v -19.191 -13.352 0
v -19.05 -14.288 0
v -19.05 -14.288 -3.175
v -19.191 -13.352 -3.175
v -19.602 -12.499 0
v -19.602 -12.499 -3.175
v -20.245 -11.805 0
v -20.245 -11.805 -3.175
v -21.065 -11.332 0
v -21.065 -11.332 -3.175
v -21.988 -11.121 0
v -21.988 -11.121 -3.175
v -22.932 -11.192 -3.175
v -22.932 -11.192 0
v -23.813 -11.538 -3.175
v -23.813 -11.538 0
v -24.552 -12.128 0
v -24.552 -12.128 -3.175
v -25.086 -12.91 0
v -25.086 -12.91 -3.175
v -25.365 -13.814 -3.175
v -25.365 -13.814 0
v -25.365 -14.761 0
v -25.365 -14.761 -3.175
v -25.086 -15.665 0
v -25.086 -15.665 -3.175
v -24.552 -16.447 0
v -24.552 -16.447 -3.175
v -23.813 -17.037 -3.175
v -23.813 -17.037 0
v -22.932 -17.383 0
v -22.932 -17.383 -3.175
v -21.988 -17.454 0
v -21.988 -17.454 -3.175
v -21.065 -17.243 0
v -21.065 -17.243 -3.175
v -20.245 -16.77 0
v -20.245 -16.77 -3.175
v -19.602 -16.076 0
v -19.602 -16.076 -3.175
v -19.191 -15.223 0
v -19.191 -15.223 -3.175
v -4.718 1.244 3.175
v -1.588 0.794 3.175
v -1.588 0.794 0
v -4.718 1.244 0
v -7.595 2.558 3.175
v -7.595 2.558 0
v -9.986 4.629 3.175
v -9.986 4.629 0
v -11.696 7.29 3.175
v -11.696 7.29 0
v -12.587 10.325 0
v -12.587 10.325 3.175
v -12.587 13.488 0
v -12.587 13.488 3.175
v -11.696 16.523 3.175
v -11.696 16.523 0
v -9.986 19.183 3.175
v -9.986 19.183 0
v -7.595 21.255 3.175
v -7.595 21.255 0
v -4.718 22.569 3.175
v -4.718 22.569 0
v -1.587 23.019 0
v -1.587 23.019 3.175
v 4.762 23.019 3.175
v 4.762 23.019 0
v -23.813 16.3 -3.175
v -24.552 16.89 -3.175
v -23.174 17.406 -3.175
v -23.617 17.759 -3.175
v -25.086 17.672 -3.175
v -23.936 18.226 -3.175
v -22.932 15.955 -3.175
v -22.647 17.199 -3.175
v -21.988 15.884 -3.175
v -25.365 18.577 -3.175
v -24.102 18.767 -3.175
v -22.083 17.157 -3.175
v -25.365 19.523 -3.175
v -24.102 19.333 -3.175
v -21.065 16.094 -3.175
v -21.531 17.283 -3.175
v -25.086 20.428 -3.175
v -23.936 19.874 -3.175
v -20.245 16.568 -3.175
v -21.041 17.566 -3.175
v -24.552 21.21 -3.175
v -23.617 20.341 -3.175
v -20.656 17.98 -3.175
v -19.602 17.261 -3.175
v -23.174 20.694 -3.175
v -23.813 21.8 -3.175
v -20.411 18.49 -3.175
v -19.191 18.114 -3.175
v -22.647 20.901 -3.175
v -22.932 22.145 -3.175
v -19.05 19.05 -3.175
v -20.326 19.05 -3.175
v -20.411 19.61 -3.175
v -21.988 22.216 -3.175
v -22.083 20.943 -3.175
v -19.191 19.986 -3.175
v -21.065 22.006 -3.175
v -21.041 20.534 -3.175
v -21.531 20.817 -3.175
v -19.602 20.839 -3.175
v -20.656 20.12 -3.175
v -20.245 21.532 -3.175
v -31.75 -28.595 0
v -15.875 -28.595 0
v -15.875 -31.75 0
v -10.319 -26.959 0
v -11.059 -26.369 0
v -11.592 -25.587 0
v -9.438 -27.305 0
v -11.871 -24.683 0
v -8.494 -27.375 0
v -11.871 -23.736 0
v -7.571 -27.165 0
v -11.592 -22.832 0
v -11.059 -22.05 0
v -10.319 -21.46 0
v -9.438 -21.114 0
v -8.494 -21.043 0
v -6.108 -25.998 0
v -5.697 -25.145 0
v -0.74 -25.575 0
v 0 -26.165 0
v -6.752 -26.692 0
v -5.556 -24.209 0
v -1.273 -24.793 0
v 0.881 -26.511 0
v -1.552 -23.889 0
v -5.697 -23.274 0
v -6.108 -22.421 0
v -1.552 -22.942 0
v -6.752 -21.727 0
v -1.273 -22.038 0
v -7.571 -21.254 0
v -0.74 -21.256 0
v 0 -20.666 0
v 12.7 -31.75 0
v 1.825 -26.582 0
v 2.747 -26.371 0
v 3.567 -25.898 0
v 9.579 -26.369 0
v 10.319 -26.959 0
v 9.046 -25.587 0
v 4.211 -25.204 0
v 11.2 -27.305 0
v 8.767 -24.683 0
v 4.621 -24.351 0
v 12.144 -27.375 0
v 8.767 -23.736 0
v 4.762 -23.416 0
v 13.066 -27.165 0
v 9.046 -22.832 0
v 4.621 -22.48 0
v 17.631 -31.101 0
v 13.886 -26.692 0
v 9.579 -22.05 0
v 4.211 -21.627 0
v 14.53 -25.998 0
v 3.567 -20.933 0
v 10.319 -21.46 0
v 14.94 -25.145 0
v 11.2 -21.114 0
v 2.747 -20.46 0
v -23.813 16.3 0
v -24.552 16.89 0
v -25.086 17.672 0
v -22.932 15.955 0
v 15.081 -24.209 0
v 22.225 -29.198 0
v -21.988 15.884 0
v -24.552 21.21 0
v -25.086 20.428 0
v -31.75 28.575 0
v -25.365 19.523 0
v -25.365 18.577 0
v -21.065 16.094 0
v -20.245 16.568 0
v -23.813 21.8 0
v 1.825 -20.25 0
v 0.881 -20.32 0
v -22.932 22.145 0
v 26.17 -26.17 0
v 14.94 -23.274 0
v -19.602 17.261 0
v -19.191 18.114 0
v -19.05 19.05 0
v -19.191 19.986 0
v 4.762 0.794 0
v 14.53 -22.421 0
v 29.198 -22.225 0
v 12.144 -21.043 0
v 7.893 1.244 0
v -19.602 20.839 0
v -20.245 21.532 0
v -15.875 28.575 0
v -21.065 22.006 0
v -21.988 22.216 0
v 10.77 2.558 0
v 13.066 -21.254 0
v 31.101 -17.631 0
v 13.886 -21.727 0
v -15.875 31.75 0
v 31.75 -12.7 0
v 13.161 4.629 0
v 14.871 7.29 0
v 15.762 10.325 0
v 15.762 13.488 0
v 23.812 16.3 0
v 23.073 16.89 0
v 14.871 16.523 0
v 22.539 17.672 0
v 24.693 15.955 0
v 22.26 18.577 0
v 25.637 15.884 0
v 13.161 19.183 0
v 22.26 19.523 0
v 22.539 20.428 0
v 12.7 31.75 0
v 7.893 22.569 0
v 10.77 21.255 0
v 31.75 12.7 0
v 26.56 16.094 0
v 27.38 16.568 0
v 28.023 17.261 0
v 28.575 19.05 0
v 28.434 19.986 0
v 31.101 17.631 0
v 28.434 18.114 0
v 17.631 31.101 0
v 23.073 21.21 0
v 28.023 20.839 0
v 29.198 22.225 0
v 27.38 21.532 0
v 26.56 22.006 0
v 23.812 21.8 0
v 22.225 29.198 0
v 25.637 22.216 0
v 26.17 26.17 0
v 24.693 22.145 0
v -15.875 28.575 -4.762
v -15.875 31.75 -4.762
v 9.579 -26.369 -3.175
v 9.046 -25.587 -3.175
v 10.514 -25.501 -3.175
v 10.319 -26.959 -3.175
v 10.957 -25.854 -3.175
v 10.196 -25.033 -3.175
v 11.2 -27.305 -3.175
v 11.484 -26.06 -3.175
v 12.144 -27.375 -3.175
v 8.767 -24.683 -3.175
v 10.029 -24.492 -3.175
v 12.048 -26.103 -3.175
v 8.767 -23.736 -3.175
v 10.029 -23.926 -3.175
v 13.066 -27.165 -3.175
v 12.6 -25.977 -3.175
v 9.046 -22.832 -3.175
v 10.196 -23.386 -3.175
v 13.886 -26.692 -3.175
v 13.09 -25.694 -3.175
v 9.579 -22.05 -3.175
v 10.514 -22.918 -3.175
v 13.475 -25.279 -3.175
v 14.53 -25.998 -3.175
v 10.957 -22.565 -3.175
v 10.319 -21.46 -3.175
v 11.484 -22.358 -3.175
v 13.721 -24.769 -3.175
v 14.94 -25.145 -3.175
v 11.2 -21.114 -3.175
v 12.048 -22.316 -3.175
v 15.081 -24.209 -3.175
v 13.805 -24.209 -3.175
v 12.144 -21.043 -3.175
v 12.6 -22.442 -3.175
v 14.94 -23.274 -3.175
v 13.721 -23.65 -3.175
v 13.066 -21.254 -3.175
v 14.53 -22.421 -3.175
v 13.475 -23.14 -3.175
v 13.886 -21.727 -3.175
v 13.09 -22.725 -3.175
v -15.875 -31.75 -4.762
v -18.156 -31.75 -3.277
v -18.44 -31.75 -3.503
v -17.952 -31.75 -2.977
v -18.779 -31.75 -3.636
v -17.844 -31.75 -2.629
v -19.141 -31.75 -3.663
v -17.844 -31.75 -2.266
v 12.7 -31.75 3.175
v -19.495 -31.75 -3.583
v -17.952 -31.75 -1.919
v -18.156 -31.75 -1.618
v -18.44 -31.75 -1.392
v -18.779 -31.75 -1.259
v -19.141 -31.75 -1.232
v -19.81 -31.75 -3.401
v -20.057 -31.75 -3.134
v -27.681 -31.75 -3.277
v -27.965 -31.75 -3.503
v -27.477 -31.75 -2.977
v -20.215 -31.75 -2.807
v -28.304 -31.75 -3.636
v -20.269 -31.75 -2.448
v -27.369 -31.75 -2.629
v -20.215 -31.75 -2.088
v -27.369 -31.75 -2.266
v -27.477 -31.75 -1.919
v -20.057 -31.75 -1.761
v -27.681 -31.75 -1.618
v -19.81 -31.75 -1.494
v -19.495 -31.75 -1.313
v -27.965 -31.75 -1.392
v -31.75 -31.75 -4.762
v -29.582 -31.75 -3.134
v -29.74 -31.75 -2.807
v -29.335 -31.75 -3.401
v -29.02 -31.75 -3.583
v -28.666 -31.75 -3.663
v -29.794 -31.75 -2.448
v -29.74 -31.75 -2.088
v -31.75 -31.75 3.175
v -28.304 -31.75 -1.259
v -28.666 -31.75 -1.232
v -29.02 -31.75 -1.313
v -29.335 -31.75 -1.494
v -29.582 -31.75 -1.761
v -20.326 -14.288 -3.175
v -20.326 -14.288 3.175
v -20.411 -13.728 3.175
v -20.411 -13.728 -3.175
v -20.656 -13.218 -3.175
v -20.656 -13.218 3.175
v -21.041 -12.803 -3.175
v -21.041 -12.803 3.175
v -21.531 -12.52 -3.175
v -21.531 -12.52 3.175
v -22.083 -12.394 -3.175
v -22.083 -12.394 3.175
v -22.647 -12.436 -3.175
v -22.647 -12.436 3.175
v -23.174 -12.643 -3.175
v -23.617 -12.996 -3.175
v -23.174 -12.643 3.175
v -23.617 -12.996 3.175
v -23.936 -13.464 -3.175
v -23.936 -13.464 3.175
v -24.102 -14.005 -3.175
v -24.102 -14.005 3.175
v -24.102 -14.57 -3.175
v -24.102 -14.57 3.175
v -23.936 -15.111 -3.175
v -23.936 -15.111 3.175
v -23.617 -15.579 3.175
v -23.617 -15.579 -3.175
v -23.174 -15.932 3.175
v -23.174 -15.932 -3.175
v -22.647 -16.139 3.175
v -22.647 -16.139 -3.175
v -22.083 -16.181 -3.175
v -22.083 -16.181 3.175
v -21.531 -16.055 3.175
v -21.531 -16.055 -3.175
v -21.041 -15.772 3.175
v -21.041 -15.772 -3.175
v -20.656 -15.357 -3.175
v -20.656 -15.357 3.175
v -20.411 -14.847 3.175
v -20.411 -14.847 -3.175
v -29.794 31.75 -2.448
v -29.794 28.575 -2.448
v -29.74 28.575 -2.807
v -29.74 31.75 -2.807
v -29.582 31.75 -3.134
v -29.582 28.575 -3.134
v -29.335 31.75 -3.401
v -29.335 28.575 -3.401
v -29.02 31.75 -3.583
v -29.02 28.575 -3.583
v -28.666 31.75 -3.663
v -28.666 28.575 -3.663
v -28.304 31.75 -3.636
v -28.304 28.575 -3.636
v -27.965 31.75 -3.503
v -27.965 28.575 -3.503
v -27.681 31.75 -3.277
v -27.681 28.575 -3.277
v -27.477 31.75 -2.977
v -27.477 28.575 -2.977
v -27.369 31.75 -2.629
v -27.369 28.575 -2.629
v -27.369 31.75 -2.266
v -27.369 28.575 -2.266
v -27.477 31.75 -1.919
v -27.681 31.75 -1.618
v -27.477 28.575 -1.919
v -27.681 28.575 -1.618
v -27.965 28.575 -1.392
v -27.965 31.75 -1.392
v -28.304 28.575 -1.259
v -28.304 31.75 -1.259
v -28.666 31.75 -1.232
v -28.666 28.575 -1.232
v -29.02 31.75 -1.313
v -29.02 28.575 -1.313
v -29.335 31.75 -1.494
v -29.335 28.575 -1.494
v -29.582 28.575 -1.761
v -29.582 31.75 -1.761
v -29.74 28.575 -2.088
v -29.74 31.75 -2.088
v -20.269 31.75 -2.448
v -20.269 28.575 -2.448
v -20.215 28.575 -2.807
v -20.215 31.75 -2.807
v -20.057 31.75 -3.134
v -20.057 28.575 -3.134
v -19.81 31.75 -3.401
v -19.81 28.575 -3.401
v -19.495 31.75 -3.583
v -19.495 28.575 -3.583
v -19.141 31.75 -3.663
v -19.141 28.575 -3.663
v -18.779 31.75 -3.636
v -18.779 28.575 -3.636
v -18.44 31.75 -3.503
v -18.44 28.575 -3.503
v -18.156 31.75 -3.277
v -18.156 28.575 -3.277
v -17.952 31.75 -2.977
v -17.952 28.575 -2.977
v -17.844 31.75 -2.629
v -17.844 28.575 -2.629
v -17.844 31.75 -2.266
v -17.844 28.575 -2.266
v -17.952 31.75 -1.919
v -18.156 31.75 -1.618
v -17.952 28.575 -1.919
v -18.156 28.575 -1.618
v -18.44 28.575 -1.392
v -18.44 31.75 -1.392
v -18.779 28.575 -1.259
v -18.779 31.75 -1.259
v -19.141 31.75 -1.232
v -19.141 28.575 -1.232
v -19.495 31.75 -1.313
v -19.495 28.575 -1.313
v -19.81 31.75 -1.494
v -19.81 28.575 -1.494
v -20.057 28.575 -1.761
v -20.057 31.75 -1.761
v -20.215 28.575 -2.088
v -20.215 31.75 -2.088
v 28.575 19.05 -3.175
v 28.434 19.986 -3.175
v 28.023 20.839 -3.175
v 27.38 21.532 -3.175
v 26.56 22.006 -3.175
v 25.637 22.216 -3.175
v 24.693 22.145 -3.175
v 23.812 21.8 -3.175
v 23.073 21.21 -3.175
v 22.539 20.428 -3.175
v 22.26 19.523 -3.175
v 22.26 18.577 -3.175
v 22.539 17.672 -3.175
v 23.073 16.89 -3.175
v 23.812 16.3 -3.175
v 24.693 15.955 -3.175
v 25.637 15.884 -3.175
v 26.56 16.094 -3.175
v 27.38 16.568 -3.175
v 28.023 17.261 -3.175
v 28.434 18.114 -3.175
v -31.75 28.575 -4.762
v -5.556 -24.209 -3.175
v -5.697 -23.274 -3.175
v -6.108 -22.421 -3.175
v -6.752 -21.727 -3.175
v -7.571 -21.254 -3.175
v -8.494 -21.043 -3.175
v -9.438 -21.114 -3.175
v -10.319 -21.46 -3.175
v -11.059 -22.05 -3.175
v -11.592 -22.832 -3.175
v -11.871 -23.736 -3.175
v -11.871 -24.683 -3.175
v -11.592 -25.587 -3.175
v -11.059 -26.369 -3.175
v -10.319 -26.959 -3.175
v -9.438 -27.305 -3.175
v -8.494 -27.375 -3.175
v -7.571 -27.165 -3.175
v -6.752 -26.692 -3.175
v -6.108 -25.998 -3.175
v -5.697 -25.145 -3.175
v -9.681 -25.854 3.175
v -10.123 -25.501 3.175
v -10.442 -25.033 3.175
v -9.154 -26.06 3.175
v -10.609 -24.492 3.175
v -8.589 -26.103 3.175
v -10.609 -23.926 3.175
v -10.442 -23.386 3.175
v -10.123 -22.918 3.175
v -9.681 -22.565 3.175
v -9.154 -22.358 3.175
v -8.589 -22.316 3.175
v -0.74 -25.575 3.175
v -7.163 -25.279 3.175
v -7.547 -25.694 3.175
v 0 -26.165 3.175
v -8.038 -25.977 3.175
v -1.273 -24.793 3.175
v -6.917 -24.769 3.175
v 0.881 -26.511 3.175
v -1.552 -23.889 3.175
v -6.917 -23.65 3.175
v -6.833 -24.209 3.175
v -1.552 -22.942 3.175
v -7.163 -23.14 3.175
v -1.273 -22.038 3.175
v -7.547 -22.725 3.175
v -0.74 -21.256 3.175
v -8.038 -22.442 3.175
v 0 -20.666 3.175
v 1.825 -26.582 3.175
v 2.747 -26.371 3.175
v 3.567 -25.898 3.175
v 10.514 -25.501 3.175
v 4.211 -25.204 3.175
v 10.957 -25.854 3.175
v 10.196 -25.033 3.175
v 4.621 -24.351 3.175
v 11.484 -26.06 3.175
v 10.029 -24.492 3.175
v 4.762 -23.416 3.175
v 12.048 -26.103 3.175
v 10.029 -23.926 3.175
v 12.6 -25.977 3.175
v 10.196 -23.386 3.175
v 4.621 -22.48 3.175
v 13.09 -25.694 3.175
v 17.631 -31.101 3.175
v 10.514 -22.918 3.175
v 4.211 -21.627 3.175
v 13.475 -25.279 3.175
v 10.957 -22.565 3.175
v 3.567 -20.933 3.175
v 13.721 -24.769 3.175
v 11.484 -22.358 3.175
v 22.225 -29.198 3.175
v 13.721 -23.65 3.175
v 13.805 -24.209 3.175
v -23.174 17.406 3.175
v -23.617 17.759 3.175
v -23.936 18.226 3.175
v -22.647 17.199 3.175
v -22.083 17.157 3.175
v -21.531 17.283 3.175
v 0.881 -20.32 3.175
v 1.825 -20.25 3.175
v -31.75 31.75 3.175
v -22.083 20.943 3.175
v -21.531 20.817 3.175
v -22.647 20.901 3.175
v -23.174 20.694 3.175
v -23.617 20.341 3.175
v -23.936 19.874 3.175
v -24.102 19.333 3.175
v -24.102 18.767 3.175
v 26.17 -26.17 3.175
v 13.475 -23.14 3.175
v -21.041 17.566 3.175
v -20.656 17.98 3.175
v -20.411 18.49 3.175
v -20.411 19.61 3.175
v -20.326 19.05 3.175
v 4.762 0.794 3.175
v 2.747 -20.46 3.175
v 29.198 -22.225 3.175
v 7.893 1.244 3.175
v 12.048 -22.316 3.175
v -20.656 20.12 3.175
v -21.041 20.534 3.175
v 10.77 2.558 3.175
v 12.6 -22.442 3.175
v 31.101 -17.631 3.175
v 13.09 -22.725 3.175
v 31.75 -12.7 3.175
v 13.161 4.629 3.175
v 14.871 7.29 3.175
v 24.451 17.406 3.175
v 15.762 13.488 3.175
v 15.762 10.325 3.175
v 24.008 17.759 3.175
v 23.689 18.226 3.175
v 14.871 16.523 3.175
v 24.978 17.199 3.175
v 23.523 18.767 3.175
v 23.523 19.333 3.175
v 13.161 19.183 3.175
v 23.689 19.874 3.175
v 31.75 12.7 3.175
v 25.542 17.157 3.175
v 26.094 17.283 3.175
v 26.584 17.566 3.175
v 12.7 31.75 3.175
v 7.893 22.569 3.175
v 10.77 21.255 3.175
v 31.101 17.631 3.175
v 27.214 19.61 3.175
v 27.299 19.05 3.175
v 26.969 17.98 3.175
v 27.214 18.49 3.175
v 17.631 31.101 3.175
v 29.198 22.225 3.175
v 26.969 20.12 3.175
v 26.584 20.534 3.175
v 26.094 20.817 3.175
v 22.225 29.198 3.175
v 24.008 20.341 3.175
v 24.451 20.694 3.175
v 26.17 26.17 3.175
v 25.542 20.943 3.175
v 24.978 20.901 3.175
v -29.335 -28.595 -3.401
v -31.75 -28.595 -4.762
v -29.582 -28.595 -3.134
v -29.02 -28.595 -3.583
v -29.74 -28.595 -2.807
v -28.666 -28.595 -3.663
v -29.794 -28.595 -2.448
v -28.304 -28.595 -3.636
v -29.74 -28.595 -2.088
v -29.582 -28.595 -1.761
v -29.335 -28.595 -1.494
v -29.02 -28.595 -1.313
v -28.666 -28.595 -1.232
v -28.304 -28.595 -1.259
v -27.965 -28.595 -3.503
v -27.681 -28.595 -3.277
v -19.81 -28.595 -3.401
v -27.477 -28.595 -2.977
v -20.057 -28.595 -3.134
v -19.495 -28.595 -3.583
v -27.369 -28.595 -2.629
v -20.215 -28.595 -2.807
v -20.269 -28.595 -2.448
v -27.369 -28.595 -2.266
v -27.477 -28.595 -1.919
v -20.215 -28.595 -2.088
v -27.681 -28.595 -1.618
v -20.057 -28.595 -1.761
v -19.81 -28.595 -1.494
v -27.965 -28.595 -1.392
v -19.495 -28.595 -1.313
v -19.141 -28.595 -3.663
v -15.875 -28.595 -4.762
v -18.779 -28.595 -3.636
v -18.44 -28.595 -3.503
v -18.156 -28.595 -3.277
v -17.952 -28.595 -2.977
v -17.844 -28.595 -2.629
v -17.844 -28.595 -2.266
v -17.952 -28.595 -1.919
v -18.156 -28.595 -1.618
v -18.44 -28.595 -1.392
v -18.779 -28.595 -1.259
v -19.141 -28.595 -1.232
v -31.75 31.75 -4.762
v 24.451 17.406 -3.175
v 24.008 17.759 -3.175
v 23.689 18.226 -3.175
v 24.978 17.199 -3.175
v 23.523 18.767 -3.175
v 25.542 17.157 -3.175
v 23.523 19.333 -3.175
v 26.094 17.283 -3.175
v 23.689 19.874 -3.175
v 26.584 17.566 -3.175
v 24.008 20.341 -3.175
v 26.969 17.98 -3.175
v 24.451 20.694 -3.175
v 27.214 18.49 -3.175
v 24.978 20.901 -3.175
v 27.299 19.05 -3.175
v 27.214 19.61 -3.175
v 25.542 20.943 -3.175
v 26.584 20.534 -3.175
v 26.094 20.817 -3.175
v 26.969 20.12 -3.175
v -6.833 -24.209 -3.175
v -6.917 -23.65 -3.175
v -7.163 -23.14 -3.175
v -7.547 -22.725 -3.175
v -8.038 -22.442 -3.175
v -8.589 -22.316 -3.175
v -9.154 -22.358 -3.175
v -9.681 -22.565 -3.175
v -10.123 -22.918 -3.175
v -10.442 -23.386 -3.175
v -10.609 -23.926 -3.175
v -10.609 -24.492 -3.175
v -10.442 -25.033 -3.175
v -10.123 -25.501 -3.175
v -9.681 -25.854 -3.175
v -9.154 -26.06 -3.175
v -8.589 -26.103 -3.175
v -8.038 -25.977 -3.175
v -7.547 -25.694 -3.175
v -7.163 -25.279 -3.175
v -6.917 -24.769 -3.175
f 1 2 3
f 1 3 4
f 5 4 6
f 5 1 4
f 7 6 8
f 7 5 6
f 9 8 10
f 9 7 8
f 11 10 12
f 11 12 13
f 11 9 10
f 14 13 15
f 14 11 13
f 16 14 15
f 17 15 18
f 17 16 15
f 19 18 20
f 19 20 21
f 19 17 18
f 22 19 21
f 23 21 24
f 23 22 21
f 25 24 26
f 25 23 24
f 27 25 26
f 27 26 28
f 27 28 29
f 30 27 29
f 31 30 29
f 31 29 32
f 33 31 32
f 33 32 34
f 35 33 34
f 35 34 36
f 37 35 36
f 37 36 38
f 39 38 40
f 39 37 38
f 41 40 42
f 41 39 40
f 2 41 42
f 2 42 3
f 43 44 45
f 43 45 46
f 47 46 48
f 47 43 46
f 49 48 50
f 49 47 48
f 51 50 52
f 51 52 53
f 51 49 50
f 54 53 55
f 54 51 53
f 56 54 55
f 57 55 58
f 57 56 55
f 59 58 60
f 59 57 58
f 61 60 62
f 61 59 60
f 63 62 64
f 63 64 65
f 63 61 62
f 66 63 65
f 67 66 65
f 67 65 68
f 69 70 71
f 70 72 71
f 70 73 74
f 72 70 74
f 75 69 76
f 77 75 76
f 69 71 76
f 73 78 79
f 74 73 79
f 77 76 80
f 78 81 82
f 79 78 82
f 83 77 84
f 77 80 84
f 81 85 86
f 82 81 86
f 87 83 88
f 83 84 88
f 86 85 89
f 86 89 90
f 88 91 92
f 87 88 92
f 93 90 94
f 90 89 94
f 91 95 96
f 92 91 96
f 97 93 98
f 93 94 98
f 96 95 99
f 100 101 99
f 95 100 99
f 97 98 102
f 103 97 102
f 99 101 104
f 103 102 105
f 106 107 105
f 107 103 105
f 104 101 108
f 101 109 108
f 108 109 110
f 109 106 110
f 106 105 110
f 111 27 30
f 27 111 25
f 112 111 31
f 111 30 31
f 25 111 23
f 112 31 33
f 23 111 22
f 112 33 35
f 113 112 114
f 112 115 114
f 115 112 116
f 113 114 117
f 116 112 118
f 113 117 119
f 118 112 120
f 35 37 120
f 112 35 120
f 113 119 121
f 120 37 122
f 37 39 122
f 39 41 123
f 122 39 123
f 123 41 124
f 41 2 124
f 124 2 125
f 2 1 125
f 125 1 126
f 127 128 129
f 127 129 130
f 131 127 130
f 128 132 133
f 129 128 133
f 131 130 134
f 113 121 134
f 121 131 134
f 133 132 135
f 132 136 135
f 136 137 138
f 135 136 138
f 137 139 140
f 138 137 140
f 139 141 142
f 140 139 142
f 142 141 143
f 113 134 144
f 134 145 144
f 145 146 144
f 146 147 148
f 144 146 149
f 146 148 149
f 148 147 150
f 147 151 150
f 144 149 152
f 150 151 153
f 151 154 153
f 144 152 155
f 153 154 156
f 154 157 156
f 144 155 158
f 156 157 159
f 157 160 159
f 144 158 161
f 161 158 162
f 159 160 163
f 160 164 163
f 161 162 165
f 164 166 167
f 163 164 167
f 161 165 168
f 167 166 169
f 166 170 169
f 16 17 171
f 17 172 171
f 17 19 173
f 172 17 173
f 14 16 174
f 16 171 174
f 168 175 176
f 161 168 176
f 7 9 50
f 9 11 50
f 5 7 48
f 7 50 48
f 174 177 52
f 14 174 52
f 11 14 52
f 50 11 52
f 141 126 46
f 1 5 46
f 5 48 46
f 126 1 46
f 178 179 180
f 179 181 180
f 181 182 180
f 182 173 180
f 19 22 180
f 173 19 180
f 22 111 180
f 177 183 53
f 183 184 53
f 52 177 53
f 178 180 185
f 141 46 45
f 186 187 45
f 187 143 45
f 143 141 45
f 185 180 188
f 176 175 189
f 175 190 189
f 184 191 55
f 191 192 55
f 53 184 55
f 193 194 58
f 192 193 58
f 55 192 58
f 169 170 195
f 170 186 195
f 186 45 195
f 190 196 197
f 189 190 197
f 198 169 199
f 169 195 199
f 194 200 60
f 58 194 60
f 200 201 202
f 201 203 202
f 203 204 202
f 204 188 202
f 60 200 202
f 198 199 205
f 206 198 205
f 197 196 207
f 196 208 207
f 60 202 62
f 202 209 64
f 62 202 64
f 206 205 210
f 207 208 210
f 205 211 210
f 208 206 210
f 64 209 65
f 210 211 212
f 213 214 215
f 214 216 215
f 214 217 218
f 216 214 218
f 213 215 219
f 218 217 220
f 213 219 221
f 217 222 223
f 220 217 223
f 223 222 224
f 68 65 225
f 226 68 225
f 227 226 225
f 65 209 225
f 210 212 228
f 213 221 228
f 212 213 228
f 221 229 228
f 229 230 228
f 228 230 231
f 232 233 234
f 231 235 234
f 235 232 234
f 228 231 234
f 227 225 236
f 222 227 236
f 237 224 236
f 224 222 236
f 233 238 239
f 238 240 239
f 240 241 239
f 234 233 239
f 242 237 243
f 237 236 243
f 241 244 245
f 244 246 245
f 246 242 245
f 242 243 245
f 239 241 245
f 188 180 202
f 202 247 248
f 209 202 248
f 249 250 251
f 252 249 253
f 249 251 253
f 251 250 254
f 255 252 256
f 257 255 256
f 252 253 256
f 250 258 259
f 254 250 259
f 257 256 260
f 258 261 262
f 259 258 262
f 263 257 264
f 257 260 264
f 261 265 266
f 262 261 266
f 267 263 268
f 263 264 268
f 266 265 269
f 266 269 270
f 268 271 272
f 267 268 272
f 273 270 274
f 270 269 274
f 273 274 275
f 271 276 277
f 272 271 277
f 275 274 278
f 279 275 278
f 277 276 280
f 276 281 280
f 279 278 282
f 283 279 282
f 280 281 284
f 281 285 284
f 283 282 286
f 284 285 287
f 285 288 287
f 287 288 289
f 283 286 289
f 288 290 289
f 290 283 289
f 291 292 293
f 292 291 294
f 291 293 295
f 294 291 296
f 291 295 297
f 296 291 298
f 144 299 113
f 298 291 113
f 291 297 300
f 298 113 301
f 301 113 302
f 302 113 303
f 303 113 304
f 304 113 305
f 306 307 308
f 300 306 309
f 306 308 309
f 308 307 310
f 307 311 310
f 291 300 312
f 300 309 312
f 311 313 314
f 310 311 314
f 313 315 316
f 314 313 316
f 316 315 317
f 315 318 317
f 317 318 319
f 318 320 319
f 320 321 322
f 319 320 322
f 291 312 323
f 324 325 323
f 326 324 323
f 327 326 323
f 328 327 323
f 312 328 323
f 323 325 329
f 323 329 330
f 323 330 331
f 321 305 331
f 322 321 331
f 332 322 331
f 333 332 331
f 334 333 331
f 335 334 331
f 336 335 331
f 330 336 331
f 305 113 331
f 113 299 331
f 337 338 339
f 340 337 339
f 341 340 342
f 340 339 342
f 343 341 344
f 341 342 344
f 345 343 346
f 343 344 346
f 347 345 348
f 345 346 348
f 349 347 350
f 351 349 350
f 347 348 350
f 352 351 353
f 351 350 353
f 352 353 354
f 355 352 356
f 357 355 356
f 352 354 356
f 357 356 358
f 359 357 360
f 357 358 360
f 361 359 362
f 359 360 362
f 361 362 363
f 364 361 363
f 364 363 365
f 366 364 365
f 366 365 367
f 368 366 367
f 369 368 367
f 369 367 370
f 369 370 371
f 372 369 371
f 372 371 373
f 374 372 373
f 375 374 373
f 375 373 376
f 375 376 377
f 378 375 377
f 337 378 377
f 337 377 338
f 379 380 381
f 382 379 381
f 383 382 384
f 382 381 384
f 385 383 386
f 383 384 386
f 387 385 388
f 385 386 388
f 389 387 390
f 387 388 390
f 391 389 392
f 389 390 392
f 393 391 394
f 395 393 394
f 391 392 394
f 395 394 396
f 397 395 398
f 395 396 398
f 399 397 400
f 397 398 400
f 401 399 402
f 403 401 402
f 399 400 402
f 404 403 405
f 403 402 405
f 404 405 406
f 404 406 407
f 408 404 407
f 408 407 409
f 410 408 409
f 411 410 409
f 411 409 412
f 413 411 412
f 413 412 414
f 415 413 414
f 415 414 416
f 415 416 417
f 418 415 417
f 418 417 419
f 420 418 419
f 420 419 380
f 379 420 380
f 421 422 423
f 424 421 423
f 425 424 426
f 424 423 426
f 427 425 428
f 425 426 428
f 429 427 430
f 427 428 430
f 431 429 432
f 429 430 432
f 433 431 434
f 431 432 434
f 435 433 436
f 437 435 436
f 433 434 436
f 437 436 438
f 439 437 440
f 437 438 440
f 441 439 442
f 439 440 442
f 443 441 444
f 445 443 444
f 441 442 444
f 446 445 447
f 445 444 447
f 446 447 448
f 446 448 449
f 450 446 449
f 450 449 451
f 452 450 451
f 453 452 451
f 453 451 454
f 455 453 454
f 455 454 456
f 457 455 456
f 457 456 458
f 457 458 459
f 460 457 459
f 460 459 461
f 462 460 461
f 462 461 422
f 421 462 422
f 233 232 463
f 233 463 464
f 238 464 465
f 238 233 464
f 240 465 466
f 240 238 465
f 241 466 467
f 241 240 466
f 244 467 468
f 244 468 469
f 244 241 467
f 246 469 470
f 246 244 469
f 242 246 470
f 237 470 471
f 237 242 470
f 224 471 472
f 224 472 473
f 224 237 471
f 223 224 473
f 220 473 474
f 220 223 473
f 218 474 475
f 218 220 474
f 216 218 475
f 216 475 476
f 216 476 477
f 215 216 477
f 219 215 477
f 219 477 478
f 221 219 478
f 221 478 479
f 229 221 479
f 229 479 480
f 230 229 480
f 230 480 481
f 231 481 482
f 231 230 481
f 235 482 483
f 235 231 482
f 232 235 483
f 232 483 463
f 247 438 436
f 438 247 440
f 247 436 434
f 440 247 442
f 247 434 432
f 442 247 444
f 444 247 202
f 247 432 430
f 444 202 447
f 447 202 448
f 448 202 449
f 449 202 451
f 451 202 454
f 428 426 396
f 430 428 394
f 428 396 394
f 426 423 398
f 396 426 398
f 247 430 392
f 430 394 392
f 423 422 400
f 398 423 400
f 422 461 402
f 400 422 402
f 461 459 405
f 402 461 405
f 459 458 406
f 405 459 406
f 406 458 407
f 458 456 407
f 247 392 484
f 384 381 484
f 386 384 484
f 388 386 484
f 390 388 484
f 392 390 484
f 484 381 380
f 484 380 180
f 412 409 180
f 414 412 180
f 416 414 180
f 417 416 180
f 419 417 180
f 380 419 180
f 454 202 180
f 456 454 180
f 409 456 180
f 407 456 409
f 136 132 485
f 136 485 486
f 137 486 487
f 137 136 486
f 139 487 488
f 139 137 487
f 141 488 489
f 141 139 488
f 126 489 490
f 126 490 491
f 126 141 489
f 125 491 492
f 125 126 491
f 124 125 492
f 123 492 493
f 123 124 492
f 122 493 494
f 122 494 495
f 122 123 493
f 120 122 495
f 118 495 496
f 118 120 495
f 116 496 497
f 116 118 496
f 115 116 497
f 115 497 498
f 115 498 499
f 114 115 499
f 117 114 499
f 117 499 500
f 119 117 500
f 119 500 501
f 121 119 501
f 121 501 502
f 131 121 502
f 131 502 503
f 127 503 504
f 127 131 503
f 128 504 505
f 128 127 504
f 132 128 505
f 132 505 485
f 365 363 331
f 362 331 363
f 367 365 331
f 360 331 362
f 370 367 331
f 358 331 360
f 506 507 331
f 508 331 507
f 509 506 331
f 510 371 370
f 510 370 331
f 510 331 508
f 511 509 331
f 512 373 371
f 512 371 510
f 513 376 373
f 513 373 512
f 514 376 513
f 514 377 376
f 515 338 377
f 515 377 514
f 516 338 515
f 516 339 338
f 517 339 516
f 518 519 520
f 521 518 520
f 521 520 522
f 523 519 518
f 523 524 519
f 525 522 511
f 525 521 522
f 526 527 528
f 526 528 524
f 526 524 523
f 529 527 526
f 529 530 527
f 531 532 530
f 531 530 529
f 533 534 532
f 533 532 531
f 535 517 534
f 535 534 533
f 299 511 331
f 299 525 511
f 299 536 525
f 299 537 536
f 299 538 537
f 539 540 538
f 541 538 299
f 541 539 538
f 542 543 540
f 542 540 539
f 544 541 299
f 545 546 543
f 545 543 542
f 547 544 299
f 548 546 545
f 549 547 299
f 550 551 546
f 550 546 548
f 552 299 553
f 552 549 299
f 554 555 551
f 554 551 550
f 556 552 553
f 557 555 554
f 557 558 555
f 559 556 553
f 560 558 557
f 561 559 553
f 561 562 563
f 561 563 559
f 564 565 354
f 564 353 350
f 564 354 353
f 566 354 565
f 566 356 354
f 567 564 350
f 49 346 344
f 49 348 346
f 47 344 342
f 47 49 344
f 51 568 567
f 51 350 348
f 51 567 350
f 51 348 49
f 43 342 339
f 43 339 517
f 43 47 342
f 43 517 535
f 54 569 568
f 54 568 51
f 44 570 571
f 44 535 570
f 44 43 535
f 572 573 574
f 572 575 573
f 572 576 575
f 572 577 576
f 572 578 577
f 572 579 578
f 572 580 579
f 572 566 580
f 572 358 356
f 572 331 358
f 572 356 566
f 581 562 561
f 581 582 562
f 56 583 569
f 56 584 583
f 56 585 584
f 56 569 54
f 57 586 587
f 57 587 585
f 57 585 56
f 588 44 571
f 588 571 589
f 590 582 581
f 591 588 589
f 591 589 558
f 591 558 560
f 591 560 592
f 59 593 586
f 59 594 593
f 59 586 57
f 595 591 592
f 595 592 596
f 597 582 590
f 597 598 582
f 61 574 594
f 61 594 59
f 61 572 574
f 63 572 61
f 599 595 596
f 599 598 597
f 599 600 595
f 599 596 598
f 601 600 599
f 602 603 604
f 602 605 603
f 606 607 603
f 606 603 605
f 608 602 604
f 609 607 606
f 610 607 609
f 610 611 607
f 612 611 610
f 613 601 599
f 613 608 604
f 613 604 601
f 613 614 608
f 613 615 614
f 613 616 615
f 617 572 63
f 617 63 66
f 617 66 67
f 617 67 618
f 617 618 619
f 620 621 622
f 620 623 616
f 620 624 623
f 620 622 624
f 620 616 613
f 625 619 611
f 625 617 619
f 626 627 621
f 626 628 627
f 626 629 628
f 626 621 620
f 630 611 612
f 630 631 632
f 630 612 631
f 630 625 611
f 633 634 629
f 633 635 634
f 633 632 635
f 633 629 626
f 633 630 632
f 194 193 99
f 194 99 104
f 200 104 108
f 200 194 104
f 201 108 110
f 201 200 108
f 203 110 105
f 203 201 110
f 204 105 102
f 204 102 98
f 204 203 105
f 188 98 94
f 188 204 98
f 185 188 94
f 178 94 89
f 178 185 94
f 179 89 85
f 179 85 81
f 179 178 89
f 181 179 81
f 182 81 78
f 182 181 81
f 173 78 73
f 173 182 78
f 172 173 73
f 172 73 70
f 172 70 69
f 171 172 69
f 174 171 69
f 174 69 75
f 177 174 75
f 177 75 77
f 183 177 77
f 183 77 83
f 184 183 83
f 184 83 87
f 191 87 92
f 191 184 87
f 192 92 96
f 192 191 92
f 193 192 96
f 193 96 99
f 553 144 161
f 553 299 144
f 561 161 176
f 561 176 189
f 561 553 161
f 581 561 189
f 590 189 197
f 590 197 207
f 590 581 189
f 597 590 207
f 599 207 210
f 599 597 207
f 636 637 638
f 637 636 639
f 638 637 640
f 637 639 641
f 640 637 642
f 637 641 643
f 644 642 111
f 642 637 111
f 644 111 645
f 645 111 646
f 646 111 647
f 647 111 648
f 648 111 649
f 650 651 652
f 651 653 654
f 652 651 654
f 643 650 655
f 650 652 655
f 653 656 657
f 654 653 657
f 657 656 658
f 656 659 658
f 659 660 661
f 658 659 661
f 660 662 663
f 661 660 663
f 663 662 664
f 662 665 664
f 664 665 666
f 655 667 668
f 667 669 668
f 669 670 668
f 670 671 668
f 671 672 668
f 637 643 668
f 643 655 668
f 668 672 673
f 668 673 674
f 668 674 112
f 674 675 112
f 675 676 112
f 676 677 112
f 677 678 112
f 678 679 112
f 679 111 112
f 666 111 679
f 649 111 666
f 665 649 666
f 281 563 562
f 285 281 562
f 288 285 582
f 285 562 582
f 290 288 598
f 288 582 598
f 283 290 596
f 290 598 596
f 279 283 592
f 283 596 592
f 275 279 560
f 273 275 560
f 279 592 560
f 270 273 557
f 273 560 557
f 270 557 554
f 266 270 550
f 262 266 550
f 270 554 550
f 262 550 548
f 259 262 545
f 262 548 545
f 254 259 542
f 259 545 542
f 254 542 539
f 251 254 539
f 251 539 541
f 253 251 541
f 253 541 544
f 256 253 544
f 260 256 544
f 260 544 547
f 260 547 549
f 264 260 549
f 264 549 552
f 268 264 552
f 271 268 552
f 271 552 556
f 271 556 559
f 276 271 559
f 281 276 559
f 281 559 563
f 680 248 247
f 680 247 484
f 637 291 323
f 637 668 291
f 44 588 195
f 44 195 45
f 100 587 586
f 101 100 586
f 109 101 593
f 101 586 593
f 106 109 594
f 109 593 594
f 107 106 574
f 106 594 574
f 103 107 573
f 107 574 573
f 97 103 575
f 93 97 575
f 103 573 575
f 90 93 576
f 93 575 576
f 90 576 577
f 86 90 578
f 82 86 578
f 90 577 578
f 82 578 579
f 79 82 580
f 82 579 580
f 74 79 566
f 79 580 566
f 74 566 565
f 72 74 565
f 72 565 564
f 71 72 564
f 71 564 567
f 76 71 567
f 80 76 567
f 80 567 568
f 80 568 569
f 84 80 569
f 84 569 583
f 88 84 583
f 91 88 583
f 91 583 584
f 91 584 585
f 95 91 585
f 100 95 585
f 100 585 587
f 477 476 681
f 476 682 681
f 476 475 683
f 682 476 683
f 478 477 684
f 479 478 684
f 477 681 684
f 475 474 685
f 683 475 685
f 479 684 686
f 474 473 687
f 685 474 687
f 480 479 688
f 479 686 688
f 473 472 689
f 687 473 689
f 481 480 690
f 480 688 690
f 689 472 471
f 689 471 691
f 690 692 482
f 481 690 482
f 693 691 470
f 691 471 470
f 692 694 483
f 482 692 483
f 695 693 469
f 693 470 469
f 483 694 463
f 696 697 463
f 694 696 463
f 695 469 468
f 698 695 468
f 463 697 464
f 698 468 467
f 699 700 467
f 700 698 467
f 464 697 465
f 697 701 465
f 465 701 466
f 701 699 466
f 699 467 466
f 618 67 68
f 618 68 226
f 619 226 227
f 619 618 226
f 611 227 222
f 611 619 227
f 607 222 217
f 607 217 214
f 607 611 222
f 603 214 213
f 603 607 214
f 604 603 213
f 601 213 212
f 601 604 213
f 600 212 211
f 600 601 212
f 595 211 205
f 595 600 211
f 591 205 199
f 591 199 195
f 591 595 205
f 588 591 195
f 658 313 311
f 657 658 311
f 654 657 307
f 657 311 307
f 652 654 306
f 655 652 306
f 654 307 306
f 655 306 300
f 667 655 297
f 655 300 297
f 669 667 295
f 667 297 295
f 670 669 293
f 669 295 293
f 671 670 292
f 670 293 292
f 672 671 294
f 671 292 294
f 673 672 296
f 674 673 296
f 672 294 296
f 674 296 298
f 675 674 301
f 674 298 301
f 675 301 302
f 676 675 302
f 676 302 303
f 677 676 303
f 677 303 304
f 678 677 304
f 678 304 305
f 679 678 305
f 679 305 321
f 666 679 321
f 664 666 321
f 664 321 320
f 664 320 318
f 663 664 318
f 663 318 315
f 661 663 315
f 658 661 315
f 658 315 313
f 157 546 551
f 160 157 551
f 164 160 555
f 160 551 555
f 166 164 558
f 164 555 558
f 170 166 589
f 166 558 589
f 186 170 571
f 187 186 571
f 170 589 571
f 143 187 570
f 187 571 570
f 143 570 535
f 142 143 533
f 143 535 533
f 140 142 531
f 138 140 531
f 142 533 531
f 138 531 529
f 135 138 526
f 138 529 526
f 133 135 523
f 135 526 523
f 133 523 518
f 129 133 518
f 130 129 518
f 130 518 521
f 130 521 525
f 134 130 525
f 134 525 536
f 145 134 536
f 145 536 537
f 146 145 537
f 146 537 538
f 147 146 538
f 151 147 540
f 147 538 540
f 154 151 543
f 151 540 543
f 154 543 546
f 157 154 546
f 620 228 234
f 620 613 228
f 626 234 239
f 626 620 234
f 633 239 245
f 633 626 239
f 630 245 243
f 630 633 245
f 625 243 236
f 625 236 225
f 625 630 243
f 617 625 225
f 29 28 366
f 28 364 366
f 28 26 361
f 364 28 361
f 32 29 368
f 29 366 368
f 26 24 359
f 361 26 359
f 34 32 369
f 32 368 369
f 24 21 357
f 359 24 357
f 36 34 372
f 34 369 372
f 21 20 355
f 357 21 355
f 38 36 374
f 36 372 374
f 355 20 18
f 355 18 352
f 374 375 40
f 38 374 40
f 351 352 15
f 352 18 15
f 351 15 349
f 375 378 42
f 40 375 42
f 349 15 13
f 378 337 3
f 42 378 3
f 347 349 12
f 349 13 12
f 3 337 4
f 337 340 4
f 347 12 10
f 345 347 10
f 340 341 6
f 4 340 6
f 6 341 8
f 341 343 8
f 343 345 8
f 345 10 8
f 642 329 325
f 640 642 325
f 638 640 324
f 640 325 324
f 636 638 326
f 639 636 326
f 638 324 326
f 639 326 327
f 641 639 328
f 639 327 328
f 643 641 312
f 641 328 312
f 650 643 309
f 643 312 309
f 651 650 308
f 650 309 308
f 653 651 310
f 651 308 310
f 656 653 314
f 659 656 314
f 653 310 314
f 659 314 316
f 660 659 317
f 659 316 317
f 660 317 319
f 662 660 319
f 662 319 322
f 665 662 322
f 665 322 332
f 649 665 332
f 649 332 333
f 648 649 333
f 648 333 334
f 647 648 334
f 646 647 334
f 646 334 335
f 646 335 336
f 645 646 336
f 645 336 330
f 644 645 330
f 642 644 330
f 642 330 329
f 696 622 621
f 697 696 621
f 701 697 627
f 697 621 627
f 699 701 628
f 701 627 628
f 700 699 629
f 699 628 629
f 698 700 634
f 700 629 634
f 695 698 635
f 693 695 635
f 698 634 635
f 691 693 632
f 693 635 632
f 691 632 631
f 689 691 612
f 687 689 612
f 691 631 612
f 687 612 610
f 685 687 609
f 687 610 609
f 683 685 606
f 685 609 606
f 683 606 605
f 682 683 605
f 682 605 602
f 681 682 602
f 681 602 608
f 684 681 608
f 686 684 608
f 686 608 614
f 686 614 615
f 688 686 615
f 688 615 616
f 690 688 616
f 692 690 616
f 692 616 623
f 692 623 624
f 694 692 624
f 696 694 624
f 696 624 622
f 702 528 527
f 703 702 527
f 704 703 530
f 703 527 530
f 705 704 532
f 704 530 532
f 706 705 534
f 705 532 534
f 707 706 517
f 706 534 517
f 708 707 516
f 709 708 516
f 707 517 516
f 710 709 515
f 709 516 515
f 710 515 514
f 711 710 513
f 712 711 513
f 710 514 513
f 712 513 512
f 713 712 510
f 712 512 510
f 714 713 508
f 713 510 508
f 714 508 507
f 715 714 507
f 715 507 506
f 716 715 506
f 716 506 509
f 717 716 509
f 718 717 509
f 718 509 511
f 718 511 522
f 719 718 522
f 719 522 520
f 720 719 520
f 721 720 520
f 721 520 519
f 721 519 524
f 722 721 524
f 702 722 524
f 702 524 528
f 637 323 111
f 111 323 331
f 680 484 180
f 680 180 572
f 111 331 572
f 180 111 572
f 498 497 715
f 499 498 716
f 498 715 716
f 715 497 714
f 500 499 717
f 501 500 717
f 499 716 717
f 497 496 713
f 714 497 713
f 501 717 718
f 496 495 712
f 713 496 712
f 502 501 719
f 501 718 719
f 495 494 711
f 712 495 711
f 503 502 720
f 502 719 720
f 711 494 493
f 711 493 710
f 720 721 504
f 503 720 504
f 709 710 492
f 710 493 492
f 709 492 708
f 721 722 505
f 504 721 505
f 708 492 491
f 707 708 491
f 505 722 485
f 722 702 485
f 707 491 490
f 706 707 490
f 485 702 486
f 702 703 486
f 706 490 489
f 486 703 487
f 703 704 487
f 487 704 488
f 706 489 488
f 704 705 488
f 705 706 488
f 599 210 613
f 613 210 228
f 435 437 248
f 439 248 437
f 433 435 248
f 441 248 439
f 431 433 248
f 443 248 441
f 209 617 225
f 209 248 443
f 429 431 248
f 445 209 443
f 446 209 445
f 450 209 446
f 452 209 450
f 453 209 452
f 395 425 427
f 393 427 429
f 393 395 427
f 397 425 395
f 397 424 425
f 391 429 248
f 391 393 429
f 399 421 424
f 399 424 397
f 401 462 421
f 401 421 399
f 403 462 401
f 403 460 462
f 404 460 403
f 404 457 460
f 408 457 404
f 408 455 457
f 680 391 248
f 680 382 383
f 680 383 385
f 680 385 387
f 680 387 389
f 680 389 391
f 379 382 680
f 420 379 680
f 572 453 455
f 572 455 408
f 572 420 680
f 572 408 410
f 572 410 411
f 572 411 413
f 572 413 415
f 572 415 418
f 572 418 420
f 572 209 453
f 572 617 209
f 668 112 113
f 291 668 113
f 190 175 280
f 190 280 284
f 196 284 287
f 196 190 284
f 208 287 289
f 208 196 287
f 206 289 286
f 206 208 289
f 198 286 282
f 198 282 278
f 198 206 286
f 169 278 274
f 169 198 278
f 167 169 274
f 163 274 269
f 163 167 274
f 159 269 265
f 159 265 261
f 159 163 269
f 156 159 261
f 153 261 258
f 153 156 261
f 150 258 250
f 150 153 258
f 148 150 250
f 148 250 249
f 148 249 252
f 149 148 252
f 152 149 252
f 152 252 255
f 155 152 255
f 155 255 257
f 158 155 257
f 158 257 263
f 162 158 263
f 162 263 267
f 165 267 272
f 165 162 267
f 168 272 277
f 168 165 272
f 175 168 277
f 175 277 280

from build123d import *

# Parameters (mm, degrees)
SKETCH1_W                 = 63.5
SKETCH1_H                 = 63.5
BOSS_EXTRUDE1_DEPTH       = 3.175
BOSS_EXTRUDE2_DEPTH       = 4.7625
F_2_CLEARANCE_HOLE2_D     = 2.4384
F_2_CLEARANCE_HOLE2_DEPTH = 3.155006513
FILLET1_R                 = 19.05
SKETCH7_W                 = 15.875
SKETCH7_H                 = 3.175
BOSS_EXTRUDE3_DEPTH       = 4.7625
F_2_CLEARANCE_HOLE3_D     = 2.4384
F_2_CLEARANCE_HOLE3_DEPTH = 3.175
BOSS_EXTRUDE4_START       = -3.175
SKETCH10_R                = 3.175
BOSS_EXTRUDE4_DEPTH       = 3.175
F_6_CLEARANCE_HOLE1_D     = 3.7973
SKETCH13_R                = 3.175
CUT_EXTRUDE1_DEPTH        = 3.175


with BuildPart() as part:
    # Sketch1 → Boss-Extrude1 (new body)
    with BuildSketch(Plane.XY):
        Rectangle(SKETCH1_W, SKETCH1_H)
    extrude(amount=BOSS_EXTRUDE1_DEPTH)

    # Sketch2 → Boss-Extrude2 (add)
    with BuildSketch(Plane(origin=(0, 0, 0), x_dir=(-1, 0, 0), z_dir=(0, 0, -1))):
        Polygon((15.875, -31.75), (25.4, -31.75), (31.75, -31.75), (31.75, -28.594993487), (25.755751185, -28.594993487), (15.875, -28.594993487), align=None)
    extrude(amount=BOSS_EXTRUDE2_DEPTH)

    # #2 Clearance Hole2
    with Locations(Plane(origin=(0, -28.594993487, 0), x_dir=(1, 0, 0), z_dir=(0, 1, 0))):
        with Locations((-28.575, 2.447629477), (-19.05, 2.447629477)):
            Hole(F_2_CLEARANCE_HOLE2_D / 2, depth=F_2_CLEARANCE_HOLE2_DEPTH)

    # Fillet1
    fillet1_edges = [part.edges().sort_by_distance(p)[0] for p in [
        (31.75, -31.75, 1.5875),
        (31.75, 31.75, 1.5875),
    ]]
    fillet(fillet1_edges, radius=FILLET1_R)

    # Sketch7 → Boss-Extrude3 (add)
    with BuildSketch(Plane(origin=(0, 0, 0), x_dir=(-1, 0, 0), z_dir=(0, 0, -1))):
        with Locations((23.8125, 30.1625)):
            Rectangle(SKETCH7_W, SKETCH7_H)
    extrude(amount=BOSS_EXTRUDE3_DEPTH)

    # #2 Clearance Hole3
    with Locations(Plane(origin=(0, 31.75, 0), x_dir=(1, 0, 0), z_dir=(0, 1, 0))):
        with Locations((-28.575, 2.447629477), (-19.05, 2.447629477)):
            Hole(F_2_CLEARANCE_HOLE3_D / 2, depth=F_2_CLEARANCE_HOLE3_DEPTH)

    # Sketch10 → Boss-Extrude4 (add)
    with BuildSketch(Plane.XY.offset(3.175).offset(BOSS_EXTRUDE4_START)):
        with Locations((25.4, 19.05)):
            Circle(SKETCH10_R)
        with Locations((-22.225, 19.05)):
            Circle(SKETCH10_R)
        with Locations((-22.225, -14.2875)):
            Circle(SKETCH10_R)
        with Locations((-8.73125, -24.209375)):
            Circle(SKETCH10_R)
        with Locations((11.90625, -24.209375)):
            Circle(SKETCH10_R)
    extrude(amount=-BOSS_EXTRUDE4_DEPTH)

    # #6 Clearance Hole1 (through all)
    with Locations(Plane(origin=(0, 0, -3.175), x_dir=(-1, 0, 0), z_dir=(0, 0, -1))):
        with Locations((-25.4, 19.05), (22.225, 19.05), (22.225, -14.2875), (8.73125, -24.209375), (-11.90625, -24.209375)):
            Hole(F_6_CLEARANCE_HOLE1_D / 2)

    # Sketch13 → Cut-Extrude1 (cut)
    with BuildSketch(Plane.XY.offset(3.175)):
        with Locations((1.5875, -23.415625)):
            Circle(SKETCH13_R)
        with BuildLine():
            Line((-1.5875, 23.01875), (4.7625, 23.01875))
            ThreePointArc((4.7625, 23.01875), (15.875, 11.90625), (4.7625, 0.79375))
            Line((4.7625, 0.79375), (-1.5875, 0.79375))
            ThreePointArc((-1.5875, 0.79375), (-12.7, 11.90625), (-1.5875, 23.01875))
        make_face()
    extrude(amount=-CUT_EXTRUDE1_DEPTH, mode=Mode.SUBTRACT)


solid = part.part
